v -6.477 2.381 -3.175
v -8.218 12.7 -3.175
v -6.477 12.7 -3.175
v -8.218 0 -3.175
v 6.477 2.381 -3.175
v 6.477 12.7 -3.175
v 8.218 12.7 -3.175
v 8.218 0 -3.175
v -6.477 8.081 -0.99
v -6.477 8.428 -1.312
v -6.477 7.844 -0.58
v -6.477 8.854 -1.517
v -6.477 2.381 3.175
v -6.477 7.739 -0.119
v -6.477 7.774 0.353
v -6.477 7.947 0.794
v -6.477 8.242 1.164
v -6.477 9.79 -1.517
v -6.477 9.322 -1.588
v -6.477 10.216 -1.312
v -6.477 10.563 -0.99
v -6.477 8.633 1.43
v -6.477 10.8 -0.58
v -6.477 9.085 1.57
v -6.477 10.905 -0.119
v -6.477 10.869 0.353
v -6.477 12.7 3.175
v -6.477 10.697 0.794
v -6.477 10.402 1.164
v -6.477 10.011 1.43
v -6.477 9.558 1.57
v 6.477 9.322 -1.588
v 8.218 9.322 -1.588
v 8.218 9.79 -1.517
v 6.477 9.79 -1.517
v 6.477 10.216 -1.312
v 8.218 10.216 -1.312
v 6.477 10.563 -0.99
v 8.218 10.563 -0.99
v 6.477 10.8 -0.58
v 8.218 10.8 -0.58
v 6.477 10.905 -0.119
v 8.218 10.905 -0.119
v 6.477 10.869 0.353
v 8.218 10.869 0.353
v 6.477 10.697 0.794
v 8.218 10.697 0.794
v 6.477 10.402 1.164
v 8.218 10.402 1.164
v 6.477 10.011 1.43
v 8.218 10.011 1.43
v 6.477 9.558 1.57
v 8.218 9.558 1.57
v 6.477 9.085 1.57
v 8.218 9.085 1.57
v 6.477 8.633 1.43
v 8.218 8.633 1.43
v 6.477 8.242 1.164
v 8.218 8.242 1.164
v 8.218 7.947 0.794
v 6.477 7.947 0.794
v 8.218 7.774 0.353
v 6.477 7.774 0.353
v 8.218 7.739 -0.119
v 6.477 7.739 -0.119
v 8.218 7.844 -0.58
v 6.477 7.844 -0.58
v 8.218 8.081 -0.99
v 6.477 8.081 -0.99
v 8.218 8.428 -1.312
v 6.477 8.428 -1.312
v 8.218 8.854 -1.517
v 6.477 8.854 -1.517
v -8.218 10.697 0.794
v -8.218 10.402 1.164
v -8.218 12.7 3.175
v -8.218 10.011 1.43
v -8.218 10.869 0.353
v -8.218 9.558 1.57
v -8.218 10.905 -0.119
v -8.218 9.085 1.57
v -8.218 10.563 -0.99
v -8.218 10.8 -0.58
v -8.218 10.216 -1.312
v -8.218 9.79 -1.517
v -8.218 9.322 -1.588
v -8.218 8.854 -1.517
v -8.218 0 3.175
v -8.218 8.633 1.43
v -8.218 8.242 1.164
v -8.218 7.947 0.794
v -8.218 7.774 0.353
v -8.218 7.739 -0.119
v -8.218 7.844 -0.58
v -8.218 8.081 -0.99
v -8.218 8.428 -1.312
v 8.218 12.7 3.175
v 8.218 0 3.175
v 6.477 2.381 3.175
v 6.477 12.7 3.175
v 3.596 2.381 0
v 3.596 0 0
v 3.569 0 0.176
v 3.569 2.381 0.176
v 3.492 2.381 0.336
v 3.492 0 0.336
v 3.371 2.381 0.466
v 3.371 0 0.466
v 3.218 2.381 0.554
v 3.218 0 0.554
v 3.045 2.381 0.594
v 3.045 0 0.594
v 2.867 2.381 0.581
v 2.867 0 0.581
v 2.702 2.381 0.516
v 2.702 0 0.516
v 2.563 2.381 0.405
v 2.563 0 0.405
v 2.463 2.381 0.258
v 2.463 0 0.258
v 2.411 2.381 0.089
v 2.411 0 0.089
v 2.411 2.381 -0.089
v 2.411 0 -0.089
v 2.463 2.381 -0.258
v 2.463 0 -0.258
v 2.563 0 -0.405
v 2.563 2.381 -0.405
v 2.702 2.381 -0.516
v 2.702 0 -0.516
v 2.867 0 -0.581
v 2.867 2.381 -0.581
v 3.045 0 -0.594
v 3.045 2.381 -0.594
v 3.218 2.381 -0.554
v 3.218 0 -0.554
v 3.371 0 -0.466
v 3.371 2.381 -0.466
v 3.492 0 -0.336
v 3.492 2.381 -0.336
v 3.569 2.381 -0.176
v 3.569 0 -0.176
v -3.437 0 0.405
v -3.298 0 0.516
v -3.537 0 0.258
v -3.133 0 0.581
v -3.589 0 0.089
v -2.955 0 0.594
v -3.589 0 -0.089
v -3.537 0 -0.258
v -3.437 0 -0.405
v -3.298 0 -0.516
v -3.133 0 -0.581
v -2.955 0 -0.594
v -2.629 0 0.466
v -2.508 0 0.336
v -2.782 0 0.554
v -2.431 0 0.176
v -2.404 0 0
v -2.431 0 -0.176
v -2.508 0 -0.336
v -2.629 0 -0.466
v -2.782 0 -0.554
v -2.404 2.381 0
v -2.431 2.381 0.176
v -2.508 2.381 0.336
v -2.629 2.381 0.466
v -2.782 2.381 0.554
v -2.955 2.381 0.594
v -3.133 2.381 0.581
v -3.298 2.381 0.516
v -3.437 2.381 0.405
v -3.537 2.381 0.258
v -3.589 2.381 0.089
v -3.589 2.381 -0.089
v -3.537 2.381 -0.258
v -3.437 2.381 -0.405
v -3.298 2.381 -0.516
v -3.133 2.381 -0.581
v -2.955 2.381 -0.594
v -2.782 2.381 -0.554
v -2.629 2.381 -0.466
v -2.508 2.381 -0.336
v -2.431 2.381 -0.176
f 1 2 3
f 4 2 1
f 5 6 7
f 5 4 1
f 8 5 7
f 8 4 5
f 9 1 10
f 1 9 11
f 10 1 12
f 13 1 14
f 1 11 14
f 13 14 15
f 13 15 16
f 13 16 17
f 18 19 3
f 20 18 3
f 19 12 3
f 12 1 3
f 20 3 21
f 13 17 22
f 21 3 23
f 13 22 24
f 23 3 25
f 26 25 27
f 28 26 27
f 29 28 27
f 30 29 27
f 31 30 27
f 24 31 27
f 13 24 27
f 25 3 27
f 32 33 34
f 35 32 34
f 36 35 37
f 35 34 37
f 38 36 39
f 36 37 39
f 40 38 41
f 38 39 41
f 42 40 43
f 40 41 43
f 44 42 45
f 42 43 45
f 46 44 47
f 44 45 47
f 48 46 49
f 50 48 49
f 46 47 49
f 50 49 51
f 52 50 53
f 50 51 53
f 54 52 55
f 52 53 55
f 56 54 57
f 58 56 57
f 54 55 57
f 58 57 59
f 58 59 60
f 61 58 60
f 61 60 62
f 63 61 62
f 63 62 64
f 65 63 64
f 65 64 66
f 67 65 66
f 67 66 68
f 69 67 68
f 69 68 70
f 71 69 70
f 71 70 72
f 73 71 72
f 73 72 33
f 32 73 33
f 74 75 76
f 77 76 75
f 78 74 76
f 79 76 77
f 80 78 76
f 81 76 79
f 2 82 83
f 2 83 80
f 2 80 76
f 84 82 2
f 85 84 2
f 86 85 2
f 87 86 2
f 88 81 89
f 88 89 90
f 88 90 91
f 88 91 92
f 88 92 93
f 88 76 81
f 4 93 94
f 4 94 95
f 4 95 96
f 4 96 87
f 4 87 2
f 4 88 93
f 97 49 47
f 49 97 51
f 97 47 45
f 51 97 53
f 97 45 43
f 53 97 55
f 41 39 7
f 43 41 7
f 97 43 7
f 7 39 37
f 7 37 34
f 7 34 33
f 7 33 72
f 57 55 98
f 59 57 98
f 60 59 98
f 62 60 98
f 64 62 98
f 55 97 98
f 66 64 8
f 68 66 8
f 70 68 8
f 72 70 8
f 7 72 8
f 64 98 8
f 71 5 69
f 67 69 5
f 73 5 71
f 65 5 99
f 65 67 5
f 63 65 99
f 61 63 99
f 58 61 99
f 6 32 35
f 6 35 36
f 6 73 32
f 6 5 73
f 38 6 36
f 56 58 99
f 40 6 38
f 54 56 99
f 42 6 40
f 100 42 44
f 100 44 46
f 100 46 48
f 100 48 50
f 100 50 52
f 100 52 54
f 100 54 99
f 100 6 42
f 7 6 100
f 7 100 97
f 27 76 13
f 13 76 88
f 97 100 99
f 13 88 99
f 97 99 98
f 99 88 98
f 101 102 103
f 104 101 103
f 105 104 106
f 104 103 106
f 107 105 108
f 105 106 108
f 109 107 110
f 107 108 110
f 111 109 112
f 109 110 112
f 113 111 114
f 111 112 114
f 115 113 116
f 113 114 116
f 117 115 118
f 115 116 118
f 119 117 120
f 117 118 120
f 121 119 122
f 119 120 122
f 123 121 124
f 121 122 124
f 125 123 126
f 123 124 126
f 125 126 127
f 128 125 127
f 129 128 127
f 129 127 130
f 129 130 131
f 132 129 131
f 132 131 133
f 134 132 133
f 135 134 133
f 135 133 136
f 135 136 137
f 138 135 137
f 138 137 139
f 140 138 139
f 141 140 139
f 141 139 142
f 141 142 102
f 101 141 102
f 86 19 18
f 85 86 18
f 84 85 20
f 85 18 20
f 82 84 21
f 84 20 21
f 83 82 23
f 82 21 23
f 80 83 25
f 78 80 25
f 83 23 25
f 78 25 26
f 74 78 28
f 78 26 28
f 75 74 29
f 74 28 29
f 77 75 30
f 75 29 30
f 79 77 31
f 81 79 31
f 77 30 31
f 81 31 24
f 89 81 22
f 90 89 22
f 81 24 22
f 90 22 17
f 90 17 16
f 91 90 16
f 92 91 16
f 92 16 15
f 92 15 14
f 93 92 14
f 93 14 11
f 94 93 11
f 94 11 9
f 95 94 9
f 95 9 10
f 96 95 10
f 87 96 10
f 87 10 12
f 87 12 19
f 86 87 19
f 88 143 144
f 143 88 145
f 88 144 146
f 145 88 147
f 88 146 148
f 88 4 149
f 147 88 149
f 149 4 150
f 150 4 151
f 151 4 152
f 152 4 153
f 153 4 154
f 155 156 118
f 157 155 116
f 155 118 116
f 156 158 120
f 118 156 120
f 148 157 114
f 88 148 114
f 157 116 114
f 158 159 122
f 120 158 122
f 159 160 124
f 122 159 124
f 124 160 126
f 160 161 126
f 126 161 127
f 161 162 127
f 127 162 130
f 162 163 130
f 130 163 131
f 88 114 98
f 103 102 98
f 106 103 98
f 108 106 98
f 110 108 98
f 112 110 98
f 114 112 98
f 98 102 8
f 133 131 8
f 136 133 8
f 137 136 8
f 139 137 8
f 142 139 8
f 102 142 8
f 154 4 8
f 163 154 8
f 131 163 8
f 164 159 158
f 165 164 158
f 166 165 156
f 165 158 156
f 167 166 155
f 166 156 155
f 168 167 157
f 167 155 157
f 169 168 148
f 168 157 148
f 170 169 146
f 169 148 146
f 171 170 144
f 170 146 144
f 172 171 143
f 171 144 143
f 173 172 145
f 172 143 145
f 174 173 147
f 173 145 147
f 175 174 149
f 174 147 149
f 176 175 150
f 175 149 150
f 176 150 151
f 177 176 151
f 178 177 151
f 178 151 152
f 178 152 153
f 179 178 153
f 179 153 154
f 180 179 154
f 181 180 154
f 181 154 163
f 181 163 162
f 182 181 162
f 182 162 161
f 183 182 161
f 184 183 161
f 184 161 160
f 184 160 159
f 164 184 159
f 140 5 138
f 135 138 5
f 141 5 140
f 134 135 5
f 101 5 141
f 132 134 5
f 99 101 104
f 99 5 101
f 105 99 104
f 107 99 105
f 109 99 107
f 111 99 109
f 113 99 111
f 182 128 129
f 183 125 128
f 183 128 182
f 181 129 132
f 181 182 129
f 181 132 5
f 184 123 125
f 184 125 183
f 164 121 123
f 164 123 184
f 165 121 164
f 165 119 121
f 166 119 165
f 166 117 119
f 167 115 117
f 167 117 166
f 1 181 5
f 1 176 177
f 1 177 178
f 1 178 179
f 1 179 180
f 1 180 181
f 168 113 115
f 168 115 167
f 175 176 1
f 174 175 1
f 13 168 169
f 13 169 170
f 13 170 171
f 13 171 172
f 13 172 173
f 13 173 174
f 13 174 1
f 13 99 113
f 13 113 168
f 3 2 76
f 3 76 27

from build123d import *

# Parameters (mm, degrees)
SKETCH1_W             = 16.435294118
SKETCH1_H             = 6.35
BOSS_EXTRUDE1_DEPTH   = 12.7
SKETCH2_W             = 12.954
SKETCH2_H             = 6.35
CUT_EXTRUDE1_DEPTH    = 10.31875
SKETCH3_R             = 1.5875
CUT_EXTRUDE2_DEPTH    = 17.435294118
F_0_80_TAPPED_HOLE1_D = 1.19126


with BuildPart() as part:
    # Sketch1 → Boss-Extrude1 (new body)
    with BuildSketch(Plane(origin=(0, 0, 0), x_dir=(1, 0, 0), z_dir=(0, 1, 0))):
        Rectangle(SKETCH1_W, SKETCH1_H)
    extrude(amount=BOSS_EXTRUDE1_DEPTH)

    # Sketch2 → Cut-Extrude1 (cut)
    with BuildSketch(Plane(origin=(0, 12.7, 0), x_dir=(-1, 0, 0), z_dir=(0, 1, 0))):
        Rectangle(SKETCH2_W, SKETCH2_H)
    extrude(amount=-CUT_EXTRUDE1_DEPTH, mode=Mode.SUBTRACT)

    # Sketch3 → Cut-Extrude2 (cut, through all)
    with BuildSketch(Plane(origin=(8.217647059, 0, 0), x_dir=(0, 0, -1), z_dir=(1, 0, 0))):
        with Locations((0, 9.3218)):
            Circle(SKETCH3_R)
    extrude(amount=-CUT_EXTRUDE2_DEPTH, mode=Mode.SUBTRACT)

    # #0-80 Tapped Hole1 (through all)
    with Locations(Plane(origin=(0, 2.38125, 0), x_dir=(-1, 0, 0), z_dir=(0, 1, 0))):
        with Locations((3, 0), (-3, 0)):
            Hole(F_0_80_TAPPED_HOLE1_D / 2)


solid = part.part
